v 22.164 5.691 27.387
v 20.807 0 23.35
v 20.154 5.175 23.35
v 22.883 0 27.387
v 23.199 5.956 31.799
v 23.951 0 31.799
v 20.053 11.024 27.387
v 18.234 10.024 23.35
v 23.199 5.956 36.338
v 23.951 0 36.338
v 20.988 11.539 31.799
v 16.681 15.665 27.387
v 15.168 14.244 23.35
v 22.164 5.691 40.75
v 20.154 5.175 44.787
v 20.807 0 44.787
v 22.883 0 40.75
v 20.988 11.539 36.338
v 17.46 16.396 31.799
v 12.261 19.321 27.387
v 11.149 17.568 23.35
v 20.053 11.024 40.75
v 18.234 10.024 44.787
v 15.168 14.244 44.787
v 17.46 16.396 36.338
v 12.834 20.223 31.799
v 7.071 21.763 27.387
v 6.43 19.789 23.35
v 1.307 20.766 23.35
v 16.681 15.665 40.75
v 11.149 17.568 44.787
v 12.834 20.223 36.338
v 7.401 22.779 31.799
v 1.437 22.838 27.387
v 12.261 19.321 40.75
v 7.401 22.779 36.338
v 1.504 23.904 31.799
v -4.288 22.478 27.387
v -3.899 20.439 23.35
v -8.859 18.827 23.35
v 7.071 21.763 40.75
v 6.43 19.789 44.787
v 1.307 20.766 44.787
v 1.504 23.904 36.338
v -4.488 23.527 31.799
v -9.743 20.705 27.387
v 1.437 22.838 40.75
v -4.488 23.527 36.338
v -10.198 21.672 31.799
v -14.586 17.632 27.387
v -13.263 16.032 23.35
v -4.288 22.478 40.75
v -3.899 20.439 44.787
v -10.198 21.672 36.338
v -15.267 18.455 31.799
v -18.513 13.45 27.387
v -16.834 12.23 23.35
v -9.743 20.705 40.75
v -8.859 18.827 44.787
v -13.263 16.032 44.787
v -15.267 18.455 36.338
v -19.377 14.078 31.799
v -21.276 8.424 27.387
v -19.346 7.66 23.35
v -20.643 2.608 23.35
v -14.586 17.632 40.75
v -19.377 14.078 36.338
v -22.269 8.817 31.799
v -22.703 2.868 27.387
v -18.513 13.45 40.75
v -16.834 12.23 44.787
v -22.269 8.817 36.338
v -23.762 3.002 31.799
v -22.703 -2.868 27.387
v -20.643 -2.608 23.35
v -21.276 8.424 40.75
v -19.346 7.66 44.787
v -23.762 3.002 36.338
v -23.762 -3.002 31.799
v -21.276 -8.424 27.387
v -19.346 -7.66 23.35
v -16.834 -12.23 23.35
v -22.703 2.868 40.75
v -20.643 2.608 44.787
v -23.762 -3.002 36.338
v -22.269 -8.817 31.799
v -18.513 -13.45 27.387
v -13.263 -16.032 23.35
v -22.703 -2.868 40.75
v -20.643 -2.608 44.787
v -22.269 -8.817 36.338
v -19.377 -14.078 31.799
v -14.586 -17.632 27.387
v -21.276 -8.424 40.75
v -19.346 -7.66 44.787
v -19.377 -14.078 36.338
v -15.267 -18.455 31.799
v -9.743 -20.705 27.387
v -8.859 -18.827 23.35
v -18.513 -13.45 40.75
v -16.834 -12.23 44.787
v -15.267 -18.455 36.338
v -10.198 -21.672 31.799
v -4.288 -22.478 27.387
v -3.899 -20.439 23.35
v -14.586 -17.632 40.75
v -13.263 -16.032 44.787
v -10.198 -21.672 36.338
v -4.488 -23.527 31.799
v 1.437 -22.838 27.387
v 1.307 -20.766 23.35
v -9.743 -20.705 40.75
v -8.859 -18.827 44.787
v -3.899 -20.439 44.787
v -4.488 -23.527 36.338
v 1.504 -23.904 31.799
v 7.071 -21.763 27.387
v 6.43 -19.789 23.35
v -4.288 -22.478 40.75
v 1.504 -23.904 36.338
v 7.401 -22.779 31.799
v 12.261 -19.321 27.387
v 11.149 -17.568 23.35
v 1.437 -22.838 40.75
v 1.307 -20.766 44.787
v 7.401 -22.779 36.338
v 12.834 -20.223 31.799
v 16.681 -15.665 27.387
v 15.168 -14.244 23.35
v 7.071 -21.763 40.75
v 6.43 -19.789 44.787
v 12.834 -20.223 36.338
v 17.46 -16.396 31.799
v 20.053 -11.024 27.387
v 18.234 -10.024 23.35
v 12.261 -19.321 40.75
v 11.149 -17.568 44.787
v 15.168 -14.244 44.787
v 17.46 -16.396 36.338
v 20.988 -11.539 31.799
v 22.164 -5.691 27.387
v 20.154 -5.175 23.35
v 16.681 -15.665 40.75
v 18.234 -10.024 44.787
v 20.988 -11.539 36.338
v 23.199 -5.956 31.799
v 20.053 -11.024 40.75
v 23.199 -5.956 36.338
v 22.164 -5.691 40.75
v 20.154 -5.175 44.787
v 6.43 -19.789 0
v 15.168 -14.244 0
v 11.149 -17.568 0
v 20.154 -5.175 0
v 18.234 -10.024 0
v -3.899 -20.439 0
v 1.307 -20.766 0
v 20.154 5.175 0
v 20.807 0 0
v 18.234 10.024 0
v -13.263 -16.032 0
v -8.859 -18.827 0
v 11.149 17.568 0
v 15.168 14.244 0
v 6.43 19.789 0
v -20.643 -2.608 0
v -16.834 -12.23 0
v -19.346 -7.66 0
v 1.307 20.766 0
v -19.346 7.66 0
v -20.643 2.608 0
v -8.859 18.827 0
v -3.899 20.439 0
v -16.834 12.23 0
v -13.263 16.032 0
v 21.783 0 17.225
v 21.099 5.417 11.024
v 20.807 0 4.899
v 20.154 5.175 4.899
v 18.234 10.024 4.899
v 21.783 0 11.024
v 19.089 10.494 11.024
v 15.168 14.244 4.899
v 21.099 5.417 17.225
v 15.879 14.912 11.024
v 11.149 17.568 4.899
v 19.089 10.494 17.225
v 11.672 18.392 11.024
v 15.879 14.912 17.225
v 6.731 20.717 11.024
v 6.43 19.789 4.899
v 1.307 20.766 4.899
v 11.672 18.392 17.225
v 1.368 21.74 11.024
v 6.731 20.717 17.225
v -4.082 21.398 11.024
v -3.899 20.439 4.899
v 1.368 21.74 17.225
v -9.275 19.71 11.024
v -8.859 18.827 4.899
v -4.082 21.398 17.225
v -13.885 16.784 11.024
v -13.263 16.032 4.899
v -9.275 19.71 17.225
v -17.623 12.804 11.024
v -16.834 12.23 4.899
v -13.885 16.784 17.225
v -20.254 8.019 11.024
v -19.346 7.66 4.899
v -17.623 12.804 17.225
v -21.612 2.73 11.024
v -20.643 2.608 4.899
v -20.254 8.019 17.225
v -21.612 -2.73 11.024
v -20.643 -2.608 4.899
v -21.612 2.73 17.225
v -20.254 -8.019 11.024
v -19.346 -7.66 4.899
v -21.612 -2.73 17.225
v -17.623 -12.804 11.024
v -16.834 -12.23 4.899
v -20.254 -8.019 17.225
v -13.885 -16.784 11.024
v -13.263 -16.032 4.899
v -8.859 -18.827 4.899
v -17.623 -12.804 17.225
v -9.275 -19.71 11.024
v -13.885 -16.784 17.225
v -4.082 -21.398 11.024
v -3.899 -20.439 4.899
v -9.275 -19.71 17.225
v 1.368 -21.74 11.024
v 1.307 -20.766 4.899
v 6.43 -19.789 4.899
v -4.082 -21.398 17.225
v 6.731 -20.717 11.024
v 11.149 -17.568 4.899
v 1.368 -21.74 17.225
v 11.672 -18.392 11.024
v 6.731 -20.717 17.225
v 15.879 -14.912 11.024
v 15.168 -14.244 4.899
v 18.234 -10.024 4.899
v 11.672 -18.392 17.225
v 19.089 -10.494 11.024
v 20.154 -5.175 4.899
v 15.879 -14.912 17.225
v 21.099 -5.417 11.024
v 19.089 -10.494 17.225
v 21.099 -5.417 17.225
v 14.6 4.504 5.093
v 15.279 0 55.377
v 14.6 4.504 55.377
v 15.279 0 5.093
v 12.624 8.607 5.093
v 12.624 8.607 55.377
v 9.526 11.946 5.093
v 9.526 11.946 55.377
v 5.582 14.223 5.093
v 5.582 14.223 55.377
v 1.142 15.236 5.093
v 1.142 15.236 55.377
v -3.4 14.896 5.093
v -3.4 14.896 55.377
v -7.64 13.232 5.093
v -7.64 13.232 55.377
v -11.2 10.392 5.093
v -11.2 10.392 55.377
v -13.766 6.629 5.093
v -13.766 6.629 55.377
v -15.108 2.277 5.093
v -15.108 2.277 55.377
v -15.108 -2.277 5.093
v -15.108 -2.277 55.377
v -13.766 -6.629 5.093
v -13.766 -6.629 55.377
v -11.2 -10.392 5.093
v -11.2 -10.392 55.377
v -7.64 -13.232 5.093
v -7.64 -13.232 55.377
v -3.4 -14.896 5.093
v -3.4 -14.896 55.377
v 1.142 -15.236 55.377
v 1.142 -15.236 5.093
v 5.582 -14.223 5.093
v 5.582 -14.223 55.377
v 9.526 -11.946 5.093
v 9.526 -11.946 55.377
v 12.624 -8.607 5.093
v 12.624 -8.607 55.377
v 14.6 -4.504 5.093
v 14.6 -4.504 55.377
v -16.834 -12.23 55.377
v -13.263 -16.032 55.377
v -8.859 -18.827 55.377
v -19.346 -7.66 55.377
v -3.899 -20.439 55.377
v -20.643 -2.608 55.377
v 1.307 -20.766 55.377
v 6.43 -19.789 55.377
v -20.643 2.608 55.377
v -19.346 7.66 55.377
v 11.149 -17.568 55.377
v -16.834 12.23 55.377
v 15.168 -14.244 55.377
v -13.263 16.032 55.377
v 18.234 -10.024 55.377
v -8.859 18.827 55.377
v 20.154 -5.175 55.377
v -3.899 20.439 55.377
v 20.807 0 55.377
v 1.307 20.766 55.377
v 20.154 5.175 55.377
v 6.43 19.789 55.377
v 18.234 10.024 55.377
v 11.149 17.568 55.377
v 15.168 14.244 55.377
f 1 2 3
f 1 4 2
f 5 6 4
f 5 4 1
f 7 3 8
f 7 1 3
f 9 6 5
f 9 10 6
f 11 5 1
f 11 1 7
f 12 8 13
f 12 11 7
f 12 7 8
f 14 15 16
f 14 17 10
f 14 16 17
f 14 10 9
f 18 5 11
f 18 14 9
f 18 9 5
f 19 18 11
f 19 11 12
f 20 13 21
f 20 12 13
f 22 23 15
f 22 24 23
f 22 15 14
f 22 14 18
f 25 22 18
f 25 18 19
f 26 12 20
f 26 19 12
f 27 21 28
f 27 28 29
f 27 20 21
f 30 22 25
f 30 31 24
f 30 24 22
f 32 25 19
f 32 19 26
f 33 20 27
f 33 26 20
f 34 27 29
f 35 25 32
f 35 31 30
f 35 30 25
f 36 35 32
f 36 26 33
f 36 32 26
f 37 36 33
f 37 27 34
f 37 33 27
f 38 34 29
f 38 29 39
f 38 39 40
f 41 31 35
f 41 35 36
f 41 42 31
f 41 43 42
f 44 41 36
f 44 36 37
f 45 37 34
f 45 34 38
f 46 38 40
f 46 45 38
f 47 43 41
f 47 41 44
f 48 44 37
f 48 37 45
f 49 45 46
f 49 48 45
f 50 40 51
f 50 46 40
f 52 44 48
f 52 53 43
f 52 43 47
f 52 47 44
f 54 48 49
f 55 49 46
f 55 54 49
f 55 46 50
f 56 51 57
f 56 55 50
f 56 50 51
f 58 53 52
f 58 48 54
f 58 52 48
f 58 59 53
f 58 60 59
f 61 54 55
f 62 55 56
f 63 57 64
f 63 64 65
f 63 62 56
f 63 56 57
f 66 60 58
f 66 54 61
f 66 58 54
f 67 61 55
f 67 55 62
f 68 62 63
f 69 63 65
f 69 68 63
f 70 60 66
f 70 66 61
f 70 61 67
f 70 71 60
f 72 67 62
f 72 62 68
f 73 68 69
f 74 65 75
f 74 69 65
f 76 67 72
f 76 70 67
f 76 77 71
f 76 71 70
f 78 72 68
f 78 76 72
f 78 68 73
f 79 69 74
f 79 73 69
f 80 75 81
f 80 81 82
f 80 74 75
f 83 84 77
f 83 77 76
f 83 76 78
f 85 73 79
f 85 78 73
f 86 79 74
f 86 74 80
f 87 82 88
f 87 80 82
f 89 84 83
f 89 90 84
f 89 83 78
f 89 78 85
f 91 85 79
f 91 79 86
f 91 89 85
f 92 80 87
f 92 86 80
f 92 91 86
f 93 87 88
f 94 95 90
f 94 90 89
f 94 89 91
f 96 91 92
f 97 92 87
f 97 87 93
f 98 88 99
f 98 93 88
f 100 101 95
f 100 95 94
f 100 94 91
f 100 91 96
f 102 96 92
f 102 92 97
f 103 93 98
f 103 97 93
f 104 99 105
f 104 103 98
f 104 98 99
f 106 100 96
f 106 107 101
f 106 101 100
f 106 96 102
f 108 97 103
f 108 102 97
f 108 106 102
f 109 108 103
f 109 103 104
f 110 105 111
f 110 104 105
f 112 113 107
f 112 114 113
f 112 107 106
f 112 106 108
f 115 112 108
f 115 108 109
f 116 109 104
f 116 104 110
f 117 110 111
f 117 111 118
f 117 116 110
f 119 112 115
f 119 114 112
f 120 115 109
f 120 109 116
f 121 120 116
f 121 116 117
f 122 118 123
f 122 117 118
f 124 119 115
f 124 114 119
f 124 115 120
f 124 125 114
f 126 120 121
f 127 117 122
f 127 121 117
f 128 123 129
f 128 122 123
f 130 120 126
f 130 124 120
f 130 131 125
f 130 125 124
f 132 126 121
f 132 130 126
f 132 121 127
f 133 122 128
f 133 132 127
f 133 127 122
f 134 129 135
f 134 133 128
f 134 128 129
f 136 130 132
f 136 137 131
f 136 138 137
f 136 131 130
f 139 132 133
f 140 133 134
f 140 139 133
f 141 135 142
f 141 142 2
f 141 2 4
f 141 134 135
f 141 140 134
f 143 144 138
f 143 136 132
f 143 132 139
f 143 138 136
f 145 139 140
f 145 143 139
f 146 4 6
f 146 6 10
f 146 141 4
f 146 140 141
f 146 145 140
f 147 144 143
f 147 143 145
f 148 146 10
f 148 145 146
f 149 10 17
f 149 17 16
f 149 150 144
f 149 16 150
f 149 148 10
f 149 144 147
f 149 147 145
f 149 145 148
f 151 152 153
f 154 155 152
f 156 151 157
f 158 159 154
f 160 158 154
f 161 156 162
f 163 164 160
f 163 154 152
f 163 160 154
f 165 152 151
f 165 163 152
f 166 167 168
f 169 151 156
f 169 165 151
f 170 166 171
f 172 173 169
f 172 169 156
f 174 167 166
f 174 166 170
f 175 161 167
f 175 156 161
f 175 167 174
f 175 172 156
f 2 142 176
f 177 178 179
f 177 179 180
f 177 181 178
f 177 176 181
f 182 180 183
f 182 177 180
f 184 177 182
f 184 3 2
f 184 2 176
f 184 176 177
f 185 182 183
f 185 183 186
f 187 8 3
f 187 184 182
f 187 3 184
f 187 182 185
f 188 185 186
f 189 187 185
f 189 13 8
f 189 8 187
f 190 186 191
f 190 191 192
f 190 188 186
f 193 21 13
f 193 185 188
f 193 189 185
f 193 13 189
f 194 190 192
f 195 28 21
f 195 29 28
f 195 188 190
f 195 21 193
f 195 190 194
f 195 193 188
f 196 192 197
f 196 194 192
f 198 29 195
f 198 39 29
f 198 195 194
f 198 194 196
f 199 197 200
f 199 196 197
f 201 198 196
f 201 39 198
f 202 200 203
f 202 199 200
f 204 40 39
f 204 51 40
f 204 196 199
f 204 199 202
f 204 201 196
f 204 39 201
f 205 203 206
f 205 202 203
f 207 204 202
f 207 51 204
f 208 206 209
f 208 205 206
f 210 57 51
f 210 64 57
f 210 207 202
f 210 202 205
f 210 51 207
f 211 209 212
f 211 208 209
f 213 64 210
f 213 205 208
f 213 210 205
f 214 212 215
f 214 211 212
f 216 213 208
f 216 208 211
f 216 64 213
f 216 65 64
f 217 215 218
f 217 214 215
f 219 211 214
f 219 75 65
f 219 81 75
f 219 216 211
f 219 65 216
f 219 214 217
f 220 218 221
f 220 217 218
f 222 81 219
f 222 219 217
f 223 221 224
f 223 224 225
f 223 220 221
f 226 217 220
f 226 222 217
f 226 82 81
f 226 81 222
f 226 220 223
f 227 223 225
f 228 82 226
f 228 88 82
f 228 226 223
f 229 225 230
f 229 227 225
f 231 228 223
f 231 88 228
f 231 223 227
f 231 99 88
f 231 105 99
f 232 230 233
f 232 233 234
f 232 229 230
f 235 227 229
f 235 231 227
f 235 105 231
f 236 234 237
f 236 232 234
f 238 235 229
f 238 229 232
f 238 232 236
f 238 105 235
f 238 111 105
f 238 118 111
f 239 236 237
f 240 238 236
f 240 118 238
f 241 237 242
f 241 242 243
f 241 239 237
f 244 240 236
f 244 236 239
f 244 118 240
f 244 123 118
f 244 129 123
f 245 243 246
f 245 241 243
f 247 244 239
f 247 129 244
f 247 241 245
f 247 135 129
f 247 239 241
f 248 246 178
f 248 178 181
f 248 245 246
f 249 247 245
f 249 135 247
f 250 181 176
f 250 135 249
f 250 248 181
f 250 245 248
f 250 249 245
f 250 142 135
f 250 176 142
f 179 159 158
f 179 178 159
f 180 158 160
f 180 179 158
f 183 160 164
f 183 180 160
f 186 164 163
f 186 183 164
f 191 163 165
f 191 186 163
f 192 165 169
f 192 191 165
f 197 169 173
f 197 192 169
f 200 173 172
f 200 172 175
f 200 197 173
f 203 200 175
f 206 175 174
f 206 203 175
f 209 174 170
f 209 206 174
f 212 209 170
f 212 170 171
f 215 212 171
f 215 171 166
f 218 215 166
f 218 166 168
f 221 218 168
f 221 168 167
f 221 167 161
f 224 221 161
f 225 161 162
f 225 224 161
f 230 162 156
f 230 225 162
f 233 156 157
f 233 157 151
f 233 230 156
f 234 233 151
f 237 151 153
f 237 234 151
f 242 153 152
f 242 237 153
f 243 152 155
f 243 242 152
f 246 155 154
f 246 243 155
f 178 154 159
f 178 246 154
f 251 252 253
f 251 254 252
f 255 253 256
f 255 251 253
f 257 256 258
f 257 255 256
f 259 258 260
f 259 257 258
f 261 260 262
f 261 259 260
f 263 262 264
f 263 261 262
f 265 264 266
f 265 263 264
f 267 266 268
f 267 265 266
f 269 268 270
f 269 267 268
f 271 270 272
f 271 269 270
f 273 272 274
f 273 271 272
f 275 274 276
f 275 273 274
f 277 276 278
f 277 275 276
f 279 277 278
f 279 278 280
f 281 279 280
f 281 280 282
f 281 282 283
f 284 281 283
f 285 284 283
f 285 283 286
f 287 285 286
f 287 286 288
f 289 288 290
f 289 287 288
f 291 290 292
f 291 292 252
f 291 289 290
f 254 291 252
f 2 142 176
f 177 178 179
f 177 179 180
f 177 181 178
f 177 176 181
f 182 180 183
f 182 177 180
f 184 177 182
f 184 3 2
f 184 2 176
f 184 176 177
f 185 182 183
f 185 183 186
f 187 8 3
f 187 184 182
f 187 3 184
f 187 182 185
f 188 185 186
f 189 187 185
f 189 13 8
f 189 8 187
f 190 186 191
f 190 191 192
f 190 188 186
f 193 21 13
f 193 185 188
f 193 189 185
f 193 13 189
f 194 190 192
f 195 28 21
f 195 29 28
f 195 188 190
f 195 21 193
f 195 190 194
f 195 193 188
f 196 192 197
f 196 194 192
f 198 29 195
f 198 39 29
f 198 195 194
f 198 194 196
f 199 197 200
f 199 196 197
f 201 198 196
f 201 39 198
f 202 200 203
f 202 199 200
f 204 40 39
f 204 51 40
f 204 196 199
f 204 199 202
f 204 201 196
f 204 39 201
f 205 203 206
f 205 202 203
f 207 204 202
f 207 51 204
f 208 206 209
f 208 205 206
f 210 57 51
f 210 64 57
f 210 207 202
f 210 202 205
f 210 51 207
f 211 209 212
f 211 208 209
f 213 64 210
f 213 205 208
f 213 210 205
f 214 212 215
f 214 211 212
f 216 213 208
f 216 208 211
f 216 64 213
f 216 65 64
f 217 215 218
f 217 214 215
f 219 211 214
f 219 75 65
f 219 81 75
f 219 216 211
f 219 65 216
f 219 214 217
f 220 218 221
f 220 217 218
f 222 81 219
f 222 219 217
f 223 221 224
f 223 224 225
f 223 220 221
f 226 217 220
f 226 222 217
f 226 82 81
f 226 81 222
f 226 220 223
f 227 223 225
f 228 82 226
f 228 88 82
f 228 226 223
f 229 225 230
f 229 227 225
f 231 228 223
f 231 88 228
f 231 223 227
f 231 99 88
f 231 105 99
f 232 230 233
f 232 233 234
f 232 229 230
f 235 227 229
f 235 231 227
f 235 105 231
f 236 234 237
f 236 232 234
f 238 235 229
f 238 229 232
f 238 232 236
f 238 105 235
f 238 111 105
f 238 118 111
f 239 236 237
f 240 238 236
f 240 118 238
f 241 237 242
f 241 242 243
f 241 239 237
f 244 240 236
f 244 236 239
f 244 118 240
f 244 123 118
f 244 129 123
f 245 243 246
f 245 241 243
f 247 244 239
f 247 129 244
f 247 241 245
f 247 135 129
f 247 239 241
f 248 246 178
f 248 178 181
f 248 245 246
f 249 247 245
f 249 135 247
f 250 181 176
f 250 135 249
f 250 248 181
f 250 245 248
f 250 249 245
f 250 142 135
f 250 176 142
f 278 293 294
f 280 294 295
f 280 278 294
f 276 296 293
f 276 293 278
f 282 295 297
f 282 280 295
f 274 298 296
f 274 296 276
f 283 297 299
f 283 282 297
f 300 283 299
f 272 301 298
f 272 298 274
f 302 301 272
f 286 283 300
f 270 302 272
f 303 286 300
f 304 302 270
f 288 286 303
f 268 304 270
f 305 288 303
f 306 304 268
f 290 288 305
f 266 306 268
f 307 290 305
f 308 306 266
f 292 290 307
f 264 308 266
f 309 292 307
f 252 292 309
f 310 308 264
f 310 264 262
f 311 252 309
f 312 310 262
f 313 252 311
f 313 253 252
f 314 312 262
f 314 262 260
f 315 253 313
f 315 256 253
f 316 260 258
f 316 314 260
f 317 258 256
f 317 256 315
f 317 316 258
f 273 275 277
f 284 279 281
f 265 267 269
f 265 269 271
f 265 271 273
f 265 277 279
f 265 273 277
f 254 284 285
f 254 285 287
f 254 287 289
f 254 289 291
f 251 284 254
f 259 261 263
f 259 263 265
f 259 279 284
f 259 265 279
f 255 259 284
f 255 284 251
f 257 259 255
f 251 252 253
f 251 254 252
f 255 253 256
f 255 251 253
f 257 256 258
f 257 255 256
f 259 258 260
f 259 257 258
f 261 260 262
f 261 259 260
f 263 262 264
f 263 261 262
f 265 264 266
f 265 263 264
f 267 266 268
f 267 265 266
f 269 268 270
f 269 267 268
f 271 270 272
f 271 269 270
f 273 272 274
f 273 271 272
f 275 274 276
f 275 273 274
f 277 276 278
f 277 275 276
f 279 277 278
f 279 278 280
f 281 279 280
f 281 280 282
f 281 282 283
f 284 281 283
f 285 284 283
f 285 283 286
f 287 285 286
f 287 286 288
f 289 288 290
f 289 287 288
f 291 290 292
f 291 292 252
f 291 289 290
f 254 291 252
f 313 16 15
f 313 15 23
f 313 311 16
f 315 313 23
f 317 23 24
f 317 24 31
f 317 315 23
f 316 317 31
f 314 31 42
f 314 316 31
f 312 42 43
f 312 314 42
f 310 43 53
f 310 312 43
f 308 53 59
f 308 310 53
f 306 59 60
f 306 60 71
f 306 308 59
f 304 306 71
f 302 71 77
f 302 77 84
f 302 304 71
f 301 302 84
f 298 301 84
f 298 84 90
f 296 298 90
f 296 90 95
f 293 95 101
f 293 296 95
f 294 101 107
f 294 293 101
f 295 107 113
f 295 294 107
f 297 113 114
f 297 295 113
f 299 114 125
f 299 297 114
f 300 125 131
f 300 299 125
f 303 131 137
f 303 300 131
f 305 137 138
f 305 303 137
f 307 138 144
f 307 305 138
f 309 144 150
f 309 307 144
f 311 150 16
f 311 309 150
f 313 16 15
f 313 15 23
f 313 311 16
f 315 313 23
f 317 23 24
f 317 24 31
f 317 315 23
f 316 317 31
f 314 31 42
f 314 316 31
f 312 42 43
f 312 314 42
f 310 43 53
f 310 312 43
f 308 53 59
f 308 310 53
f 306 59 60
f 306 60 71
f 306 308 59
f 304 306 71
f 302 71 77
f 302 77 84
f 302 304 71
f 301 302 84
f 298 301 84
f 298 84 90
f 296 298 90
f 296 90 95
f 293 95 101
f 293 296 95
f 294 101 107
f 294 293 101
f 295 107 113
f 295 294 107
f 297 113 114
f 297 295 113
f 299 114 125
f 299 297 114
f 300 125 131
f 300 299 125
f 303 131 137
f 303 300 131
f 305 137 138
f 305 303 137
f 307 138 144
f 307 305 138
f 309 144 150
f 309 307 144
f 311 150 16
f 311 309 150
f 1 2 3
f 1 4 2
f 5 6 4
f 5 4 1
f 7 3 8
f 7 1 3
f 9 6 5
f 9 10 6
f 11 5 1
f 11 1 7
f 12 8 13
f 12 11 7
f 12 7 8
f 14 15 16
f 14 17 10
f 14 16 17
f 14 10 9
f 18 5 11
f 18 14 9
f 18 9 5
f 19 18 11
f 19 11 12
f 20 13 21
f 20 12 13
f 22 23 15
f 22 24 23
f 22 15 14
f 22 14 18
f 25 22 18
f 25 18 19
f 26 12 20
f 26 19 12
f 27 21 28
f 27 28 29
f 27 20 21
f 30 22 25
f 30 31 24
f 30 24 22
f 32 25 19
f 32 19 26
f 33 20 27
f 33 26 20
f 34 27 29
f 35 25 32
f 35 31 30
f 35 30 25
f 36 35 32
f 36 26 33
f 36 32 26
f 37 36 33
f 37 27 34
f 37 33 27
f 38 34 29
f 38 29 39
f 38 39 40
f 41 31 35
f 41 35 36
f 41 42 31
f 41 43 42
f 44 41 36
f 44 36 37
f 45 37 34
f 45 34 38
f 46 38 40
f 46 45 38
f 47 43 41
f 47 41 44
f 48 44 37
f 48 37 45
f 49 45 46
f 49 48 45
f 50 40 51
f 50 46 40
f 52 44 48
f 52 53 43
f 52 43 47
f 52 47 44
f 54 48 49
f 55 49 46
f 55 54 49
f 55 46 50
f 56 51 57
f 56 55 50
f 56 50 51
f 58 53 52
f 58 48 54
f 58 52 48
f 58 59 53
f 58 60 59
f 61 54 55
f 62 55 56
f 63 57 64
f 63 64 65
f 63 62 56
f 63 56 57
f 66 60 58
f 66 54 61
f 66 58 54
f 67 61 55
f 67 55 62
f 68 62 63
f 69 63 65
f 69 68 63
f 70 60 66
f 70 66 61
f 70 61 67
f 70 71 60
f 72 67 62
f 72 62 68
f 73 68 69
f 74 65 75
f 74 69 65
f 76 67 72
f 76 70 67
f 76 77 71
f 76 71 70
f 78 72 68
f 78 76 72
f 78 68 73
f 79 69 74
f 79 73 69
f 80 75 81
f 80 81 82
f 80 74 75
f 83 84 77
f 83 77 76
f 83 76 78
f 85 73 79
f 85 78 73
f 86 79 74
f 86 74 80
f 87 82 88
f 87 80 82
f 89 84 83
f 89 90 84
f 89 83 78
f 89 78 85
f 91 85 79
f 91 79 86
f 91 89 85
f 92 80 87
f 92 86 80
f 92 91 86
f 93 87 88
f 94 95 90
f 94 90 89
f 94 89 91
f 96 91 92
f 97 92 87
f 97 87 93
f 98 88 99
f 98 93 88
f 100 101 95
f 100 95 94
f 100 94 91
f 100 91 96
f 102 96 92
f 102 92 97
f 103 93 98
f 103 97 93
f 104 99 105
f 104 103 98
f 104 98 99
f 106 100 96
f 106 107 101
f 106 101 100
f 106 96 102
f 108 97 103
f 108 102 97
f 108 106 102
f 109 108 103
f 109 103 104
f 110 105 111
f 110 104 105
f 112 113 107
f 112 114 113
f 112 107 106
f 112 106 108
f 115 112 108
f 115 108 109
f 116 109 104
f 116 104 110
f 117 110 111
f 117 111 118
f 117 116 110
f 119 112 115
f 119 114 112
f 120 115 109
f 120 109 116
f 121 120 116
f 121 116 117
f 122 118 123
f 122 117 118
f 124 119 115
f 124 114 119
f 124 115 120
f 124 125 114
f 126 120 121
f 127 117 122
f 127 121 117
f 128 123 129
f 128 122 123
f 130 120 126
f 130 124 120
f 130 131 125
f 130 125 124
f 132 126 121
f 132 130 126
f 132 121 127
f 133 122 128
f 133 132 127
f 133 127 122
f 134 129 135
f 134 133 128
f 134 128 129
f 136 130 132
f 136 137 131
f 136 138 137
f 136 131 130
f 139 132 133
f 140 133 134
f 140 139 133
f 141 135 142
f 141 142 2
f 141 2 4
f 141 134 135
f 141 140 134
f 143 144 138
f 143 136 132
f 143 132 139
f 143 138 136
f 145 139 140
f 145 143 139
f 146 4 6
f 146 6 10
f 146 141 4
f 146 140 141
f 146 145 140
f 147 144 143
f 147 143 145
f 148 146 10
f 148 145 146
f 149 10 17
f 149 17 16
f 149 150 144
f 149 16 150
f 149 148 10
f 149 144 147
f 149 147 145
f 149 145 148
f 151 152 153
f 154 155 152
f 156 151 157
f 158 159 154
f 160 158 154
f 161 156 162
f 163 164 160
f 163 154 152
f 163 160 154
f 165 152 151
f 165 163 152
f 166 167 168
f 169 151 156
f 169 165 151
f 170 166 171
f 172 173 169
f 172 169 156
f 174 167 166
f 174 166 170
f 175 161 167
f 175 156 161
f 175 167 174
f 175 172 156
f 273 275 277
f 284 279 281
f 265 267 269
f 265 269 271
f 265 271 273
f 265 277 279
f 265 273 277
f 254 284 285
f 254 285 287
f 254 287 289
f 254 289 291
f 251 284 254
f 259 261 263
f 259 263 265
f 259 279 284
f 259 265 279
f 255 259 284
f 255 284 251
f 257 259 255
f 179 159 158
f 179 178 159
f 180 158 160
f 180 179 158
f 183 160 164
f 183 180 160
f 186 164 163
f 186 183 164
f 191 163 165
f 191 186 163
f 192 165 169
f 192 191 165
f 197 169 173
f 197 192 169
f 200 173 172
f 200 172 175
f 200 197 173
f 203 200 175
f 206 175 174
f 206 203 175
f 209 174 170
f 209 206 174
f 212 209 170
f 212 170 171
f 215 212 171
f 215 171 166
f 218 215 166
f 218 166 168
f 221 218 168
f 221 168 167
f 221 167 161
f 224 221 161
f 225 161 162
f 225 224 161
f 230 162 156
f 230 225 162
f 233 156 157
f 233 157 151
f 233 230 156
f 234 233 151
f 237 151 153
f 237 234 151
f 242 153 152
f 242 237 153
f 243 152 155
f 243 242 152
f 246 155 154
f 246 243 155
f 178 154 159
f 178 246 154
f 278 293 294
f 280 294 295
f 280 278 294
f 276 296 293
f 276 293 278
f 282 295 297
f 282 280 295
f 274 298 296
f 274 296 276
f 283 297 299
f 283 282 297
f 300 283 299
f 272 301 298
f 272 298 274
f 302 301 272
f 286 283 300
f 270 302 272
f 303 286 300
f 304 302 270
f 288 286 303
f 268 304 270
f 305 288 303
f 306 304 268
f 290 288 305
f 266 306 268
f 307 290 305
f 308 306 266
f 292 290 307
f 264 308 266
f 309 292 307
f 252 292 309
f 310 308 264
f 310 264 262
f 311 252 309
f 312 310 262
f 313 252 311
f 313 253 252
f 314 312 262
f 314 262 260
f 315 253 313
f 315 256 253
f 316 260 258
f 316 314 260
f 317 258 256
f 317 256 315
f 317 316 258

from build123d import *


with BuildPart() as f1:
    # F0 (on Front) → F1 (revolve)
    with BuildSketch(Plane.XZ):
        with BuildLine():
            Line((0, 5.093039), (0, 0))
            Line((0, 0), (20.807387, 0))
            Line((20.807387, 0), (20.807387, 4.899326))
            ThreePointArc((20.807387, 4.899326), (21.906005, 14.124552), (20.807387, 23.349779))
            ThreePointArc((20.807387, 23.349779), (24.085966, 34.068255), (20.807387, 44.786732))
            Line((20.807387, 44.786732), (20.807387, 55.376977))
            Line((20.807387, 55.376977), (15.279118, 55.376977))
            Line((15.279118, 55.376977), (15.279118, 5.093039))
            Line((15.279118, 5.093039), (0, 5.093039))
        make_face()
    revolve(axis=Axis((0, 0, 27.688488), (0, 0, 1)))


with BuildPart() as f2:
    # F0 (on Front) → F2 (revolve)
    with BuildSketch(Plane.XZ):
        with BuildLine():
            Line((0, 5.093039), (0, 0))
            Line((0, 0), (20.807387, 0))
            Line((20.807387, 0), (20.807387, 4.899326))
            ThreePointArc((20.807387, 4.899326), (21.906005, 14.124552), (20.807387, 23.349779))
            ThreePointArc((20.807387, 23.349779), (24.085966, 34.068255), (20.807387, 44.786732))
            Line((20.807387, 44.786732), (20.807387, 55.376977))
            Line((20.807387, 55.376977), (15.279118, 55.376977))
            Line((15.279118, 55.376977), (15.279118, 5.093039))
            Line((15.279118, 5.093039), (0, 5.093039))
        make_face()
    revolve(axis=Axis((0, 0, 27.688488), (0, 0, 1)))


solid = Compound([f1.part, f2.part])
